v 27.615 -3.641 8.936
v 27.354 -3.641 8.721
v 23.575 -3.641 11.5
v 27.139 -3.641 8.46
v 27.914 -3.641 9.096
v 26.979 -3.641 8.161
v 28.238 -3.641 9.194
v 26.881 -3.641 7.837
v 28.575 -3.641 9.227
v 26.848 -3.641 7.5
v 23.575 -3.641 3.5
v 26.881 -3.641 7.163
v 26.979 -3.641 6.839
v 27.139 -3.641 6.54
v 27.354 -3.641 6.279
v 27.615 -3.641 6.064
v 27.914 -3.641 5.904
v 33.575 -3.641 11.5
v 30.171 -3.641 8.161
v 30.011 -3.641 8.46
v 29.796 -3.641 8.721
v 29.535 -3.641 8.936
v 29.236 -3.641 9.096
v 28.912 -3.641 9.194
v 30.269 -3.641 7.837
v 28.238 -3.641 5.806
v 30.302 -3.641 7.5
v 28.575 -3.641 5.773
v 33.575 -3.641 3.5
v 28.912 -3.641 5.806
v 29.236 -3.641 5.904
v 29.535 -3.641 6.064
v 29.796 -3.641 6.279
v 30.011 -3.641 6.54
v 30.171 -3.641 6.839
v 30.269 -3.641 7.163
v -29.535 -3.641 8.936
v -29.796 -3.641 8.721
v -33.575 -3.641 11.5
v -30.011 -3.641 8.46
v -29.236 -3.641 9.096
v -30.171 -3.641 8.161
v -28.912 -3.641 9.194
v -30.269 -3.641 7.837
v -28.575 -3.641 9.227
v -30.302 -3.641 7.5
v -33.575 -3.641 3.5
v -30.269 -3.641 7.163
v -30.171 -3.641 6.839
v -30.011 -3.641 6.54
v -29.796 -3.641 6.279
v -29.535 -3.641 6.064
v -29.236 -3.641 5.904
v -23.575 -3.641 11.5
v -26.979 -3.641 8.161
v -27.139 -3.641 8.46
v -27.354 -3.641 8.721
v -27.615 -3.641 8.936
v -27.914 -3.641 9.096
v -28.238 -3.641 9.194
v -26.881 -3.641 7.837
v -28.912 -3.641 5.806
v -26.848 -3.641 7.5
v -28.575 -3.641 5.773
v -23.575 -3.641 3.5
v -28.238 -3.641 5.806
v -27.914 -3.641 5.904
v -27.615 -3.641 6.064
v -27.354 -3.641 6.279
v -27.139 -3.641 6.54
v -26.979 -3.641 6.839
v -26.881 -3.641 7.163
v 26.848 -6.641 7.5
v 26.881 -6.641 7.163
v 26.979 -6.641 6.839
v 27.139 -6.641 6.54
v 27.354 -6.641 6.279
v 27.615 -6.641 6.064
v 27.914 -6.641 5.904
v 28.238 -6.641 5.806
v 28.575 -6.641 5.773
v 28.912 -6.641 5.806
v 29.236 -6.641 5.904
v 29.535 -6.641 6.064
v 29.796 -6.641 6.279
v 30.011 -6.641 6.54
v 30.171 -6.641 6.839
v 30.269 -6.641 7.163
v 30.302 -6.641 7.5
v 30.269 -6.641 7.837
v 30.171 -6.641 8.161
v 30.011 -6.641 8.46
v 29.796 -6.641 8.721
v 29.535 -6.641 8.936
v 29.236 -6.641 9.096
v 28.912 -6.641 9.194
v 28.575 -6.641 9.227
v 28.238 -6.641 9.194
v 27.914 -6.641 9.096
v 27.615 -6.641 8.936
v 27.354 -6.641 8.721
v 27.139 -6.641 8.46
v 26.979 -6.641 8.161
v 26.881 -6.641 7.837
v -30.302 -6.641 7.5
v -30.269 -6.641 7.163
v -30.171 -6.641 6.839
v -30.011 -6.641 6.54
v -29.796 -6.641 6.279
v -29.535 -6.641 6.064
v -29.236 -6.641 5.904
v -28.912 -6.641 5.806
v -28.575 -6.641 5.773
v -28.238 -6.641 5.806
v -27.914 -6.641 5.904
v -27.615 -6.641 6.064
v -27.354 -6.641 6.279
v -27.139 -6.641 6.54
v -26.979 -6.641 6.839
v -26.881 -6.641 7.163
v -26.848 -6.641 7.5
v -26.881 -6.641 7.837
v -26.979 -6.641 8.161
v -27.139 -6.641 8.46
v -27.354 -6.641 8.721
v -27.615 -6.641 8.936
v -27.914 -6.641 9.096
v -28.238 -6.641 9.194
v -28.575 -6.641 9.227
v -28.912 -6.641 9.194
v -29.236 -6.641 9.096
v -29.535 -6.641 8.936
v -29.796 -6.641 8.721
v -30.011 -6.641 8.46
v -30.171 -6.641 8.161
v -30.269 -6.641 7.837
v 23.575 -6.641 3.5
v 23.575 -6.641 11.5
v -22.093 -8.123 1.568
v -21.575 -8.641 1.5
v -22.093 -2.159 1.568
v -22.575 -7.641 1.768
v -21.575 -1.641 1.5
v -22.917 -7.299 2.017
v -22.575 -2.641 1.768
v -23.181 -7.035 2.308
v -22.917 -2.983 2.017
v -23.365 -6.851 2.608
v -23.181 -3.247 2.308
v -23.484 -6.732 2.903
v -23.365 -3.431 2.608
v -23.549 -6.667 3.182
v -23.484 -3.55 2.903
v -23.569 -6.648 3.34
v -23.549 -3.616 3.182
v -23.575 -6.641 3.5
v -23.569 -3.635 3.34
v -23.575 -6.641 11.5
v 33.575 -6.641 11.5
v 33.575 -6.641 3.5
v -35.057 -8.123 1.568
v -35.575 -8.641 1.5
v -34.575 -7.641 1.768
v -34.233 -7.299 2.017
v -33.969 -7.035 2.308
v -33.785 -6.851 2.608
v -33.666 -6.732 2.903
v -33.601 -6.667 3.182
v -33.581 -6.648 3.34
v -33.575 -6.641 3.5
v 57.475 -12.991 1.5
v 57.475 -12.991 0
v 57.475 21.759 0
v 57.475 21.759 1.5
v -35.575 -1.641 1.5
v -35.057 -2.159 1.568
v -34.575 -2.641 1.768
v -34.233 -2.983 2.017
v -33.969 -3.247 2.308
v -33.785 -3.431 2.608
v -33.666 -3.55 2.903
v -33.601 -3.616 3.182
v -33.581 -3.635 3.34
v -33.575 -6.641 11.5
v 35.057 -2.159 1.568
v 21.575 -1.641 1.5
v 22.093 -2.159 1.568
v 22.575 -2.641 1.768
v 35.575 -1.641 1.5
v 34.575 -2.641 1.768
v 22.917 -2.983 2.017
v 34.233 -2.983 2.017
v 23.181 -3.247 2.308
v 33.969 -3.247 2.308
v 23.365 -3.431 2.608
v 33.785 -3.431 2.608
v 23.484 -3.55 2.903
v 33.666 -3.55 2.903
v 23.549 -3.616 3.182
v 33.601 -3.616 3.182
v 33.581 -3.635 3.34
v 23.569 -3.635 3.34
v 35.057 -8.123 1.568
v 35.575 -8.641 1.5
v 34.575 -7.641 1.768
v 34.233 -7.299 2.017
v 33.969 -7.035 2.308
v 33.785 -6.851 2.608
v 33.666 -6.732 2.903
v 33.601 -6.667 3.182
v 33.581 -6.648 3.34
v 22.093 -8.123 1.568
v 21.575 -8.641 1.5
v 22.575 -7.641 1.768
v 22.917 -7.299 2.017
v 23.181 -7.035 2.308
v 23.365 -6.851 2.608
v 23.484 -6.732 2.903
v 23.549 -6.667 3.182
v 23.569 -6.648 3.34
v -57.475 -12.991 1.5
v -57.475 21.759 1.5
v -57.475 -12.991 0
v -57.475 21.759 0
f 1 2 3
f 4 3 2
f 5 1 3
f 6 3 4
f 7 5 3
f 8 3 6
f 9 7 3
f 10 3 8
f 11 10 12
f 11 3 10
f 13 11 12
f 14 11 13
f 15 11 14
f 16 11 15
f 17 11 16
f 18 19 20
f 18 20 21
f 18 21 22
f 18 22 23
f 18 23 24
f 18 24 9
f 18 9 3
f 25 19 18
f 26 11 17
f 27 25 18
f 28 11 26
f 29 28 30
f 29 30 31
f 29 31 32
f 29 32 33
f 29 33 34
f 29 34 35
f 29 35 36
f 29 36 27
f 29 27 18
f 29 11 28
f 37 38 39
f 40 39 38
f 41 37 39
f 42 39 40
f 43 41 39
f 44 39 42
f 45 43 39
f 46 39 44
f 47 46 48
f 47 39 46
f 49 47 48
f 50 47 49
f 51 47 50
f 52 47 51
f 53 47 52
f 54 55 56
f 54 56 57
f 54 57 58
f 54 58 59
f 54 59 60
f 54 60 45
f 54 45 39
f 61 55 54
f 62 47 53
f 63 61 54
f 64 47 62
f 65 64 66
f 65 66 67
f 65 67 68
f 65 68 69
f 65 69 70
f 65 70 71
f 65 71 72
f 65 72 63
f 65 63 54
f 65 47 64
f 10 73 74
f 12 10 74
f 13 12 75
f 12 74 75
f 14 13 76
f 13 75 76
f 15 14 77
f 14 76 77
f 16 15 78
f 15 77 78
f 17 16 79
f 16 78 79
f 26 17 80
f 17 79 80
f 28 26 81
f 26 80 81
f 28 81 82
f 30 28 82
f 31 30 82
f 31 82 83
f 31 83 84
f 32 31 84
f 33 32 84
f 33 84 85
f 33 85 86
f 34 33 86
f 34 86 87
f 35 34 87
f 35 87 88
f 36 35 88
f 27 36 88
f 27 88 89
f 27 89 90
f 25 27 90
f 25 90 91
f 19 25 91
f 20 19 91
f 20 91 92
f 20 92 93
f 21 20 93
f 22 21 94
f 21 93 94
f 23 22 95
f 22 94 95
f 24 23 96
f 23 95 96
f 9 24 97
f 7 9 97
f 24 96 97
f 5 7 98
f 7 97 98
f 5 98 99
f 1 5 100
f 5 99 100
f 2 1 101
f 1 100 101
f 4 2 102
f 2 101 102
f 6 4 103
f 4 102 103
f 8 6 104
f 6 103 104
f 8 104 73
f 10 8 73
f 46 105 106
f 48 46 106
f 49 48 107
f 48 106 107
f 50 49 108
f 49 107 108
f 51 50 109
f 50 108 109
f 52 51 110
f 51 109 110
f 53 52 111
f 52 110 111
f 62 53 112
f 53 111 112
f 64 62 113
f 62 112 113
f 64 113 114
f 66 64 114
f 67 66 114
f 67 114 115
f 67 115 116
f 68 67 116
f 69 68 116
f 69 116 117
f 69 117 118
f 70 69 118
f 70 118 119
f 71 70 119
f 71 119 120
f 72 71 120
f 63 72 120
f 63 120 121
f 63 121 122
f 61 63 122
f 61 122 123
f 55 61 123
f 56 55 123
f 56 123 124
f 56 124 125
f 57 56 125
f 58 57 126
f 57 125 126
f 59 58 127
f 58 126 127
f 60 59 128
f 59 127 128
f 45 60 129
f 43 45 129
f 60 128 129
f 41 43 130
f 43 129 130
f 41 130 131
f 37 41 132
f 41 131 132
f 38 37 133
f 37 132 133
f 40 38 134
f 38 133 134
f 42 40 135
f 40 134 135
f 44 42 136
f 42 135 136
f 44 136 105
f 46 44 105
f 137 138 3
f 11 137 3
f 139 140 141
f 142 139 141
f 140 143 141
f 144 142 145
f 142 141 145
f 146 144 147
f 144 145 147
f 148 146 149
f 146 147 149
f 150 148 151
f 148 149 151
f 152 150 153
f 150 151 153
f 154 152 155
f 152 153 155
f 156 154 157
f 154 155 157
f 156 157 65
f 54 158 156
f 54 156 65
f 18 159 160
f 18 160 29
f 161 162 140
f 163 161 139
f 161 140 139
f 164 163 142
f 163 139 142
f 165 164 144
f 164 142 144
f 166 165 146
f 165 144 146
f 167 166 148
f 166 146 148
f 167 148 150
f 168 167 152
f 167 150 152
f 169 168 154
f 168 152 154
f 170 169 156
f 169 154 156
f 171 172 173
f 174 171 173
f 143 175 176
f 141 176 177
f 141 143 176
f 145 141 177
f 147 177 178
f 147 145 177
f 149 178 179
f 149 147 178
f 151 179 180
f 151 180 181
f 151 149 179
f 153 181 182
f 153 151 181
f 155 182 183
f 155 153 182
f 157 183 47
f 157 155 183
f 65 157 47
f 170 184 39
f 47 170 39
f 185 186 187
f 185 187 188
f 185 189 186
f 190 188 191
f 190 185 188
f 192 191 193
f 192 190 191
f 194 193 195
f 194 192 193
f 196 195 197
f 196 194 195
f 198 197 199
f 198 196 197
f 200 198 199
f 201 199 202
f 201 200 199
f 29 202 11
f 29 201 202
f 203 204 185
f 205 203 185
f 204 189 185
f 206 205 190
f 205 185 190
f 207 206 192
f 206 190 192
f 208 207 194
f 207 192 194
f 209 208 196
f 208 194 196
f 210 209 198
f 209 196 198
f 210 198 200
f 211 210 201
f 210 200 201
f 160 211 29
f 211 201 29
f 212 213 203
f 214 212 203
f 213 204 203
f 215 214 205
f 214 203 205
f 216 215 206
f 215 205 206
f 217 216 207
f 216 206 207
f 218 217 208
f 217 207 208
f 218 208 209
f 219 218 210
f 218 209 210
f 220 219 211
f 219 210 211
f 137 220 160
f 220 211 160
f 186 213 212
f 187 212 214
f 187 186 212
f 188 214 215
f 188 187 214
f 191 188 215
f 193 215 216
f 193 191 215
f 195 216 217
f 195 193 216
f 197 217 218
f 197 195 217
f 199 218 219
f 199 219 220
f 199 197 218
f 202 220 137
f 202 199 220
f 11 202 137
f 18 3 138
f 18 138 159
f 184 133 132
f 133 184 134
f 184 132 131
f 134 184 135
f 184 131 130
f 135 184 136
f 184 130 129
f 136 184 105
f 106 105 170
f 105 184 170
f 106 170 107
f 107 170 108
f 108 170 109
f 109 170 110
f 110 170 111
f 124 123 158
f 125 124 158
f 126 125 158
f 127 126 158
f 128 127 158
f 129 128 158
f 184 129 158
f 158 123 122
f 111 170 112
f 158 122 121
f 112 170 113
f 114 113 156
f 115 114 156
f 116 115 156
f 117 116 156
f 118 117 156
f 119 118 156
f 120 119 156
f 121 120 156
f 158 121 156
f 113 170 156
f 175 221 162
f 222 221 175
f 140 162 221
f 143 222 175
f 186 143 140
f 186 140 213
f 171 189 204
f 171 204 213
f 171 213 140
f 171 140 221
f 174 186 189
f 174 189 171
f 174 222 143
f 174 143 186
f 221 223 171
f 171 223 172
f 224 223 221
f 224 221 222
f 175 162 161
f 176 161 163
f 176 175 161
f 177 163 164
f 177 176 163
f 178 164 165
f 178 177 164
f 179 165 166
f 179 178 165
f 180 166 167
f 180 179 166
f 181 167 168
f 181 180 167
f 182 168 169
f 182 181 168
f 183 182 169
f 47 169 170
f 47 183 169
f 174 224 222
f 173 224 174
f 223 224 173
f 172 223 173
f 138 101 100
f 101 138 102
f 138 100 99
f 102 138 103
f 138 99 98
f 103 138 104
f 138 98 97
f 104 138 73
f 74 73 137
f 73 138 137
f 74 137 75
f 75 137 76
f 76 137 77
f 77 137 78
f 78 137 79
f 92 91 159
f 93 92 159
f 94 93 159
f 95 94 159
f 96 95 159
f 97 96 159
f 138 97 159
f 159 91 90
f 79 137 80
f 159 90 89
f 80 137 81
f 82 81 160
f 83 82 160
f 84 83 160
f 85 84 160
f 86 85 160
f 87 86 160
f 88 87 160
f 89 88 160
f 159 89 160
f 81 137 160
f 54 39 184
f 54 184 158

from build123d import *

# Parameters (mm, degrees)
SKETCH1_W             = 114.95
SKETCH1_H             = 34.75
REARPANEL_DEPTH       = 1.5
SKETCH2_W             = 10
SKETCH2_H             = 3
SCREWMOUNTS_DEPTH     = 10
FILLET1_R             = 2
F_4_CLEARANCE_HOLE1_D = 3.4544


with BuildPart() as part:
    # Sketch1 → RearPanel (new body)
    with BuildSketch(Plane.XY):
        with Locations((0, 4.383882718)):
            Rectangle(SKETCH1_W, SKETCH1_H)
    extrude(amount=REARPANEL_DEPTH)

    # Sketch2 → ScrewMounts (add)
    with BuildSketch(Plane.XY.offset(1.5)):
        with Locations((28.575, -5.141117282)):
            Rectangle(SKETCH2_W, SKETCH2_H)
        with Locations((-28.575, -5.141117282)):
            Rectangle(SKETCH2_W, SKETCH2_H)
    extrude(amount=SCREWMOUNTS_DEPTH)

    # Fillet1
    fillet1_edges = [part.edges().sort_by_distance(p)[0] for p in [
        (-33.575, -5.141117282, 1.5),
        (-28.575, -6.641117282, 1.5),
        (-23.575, -5.141117282, 1.5),
        (-28.575, -3.641117282, 1.5),
        (23.575, -5.141117282, 1.5),
        (28.575, -6.641117282, 1.5),
        (33.575, -5.141117282, 1.5),
        (28.575, -3.641117282, 1.5),
    ]]
    fillet(fillet1_edges, radius=FILLET1_R)

    # #4 Clearance Hole1 (through all)
    with Locations(Plane(origin=(0, -3.641117282, 0), x_dir=(1, 0, 0), z_dir=(0, 1, 0))):
        with Locations((28.575, -7.5), (-28.575, -7.5)):
            Hole(F_4_CLEARANCE_HOLE1_D / 2)


solid = part.part
